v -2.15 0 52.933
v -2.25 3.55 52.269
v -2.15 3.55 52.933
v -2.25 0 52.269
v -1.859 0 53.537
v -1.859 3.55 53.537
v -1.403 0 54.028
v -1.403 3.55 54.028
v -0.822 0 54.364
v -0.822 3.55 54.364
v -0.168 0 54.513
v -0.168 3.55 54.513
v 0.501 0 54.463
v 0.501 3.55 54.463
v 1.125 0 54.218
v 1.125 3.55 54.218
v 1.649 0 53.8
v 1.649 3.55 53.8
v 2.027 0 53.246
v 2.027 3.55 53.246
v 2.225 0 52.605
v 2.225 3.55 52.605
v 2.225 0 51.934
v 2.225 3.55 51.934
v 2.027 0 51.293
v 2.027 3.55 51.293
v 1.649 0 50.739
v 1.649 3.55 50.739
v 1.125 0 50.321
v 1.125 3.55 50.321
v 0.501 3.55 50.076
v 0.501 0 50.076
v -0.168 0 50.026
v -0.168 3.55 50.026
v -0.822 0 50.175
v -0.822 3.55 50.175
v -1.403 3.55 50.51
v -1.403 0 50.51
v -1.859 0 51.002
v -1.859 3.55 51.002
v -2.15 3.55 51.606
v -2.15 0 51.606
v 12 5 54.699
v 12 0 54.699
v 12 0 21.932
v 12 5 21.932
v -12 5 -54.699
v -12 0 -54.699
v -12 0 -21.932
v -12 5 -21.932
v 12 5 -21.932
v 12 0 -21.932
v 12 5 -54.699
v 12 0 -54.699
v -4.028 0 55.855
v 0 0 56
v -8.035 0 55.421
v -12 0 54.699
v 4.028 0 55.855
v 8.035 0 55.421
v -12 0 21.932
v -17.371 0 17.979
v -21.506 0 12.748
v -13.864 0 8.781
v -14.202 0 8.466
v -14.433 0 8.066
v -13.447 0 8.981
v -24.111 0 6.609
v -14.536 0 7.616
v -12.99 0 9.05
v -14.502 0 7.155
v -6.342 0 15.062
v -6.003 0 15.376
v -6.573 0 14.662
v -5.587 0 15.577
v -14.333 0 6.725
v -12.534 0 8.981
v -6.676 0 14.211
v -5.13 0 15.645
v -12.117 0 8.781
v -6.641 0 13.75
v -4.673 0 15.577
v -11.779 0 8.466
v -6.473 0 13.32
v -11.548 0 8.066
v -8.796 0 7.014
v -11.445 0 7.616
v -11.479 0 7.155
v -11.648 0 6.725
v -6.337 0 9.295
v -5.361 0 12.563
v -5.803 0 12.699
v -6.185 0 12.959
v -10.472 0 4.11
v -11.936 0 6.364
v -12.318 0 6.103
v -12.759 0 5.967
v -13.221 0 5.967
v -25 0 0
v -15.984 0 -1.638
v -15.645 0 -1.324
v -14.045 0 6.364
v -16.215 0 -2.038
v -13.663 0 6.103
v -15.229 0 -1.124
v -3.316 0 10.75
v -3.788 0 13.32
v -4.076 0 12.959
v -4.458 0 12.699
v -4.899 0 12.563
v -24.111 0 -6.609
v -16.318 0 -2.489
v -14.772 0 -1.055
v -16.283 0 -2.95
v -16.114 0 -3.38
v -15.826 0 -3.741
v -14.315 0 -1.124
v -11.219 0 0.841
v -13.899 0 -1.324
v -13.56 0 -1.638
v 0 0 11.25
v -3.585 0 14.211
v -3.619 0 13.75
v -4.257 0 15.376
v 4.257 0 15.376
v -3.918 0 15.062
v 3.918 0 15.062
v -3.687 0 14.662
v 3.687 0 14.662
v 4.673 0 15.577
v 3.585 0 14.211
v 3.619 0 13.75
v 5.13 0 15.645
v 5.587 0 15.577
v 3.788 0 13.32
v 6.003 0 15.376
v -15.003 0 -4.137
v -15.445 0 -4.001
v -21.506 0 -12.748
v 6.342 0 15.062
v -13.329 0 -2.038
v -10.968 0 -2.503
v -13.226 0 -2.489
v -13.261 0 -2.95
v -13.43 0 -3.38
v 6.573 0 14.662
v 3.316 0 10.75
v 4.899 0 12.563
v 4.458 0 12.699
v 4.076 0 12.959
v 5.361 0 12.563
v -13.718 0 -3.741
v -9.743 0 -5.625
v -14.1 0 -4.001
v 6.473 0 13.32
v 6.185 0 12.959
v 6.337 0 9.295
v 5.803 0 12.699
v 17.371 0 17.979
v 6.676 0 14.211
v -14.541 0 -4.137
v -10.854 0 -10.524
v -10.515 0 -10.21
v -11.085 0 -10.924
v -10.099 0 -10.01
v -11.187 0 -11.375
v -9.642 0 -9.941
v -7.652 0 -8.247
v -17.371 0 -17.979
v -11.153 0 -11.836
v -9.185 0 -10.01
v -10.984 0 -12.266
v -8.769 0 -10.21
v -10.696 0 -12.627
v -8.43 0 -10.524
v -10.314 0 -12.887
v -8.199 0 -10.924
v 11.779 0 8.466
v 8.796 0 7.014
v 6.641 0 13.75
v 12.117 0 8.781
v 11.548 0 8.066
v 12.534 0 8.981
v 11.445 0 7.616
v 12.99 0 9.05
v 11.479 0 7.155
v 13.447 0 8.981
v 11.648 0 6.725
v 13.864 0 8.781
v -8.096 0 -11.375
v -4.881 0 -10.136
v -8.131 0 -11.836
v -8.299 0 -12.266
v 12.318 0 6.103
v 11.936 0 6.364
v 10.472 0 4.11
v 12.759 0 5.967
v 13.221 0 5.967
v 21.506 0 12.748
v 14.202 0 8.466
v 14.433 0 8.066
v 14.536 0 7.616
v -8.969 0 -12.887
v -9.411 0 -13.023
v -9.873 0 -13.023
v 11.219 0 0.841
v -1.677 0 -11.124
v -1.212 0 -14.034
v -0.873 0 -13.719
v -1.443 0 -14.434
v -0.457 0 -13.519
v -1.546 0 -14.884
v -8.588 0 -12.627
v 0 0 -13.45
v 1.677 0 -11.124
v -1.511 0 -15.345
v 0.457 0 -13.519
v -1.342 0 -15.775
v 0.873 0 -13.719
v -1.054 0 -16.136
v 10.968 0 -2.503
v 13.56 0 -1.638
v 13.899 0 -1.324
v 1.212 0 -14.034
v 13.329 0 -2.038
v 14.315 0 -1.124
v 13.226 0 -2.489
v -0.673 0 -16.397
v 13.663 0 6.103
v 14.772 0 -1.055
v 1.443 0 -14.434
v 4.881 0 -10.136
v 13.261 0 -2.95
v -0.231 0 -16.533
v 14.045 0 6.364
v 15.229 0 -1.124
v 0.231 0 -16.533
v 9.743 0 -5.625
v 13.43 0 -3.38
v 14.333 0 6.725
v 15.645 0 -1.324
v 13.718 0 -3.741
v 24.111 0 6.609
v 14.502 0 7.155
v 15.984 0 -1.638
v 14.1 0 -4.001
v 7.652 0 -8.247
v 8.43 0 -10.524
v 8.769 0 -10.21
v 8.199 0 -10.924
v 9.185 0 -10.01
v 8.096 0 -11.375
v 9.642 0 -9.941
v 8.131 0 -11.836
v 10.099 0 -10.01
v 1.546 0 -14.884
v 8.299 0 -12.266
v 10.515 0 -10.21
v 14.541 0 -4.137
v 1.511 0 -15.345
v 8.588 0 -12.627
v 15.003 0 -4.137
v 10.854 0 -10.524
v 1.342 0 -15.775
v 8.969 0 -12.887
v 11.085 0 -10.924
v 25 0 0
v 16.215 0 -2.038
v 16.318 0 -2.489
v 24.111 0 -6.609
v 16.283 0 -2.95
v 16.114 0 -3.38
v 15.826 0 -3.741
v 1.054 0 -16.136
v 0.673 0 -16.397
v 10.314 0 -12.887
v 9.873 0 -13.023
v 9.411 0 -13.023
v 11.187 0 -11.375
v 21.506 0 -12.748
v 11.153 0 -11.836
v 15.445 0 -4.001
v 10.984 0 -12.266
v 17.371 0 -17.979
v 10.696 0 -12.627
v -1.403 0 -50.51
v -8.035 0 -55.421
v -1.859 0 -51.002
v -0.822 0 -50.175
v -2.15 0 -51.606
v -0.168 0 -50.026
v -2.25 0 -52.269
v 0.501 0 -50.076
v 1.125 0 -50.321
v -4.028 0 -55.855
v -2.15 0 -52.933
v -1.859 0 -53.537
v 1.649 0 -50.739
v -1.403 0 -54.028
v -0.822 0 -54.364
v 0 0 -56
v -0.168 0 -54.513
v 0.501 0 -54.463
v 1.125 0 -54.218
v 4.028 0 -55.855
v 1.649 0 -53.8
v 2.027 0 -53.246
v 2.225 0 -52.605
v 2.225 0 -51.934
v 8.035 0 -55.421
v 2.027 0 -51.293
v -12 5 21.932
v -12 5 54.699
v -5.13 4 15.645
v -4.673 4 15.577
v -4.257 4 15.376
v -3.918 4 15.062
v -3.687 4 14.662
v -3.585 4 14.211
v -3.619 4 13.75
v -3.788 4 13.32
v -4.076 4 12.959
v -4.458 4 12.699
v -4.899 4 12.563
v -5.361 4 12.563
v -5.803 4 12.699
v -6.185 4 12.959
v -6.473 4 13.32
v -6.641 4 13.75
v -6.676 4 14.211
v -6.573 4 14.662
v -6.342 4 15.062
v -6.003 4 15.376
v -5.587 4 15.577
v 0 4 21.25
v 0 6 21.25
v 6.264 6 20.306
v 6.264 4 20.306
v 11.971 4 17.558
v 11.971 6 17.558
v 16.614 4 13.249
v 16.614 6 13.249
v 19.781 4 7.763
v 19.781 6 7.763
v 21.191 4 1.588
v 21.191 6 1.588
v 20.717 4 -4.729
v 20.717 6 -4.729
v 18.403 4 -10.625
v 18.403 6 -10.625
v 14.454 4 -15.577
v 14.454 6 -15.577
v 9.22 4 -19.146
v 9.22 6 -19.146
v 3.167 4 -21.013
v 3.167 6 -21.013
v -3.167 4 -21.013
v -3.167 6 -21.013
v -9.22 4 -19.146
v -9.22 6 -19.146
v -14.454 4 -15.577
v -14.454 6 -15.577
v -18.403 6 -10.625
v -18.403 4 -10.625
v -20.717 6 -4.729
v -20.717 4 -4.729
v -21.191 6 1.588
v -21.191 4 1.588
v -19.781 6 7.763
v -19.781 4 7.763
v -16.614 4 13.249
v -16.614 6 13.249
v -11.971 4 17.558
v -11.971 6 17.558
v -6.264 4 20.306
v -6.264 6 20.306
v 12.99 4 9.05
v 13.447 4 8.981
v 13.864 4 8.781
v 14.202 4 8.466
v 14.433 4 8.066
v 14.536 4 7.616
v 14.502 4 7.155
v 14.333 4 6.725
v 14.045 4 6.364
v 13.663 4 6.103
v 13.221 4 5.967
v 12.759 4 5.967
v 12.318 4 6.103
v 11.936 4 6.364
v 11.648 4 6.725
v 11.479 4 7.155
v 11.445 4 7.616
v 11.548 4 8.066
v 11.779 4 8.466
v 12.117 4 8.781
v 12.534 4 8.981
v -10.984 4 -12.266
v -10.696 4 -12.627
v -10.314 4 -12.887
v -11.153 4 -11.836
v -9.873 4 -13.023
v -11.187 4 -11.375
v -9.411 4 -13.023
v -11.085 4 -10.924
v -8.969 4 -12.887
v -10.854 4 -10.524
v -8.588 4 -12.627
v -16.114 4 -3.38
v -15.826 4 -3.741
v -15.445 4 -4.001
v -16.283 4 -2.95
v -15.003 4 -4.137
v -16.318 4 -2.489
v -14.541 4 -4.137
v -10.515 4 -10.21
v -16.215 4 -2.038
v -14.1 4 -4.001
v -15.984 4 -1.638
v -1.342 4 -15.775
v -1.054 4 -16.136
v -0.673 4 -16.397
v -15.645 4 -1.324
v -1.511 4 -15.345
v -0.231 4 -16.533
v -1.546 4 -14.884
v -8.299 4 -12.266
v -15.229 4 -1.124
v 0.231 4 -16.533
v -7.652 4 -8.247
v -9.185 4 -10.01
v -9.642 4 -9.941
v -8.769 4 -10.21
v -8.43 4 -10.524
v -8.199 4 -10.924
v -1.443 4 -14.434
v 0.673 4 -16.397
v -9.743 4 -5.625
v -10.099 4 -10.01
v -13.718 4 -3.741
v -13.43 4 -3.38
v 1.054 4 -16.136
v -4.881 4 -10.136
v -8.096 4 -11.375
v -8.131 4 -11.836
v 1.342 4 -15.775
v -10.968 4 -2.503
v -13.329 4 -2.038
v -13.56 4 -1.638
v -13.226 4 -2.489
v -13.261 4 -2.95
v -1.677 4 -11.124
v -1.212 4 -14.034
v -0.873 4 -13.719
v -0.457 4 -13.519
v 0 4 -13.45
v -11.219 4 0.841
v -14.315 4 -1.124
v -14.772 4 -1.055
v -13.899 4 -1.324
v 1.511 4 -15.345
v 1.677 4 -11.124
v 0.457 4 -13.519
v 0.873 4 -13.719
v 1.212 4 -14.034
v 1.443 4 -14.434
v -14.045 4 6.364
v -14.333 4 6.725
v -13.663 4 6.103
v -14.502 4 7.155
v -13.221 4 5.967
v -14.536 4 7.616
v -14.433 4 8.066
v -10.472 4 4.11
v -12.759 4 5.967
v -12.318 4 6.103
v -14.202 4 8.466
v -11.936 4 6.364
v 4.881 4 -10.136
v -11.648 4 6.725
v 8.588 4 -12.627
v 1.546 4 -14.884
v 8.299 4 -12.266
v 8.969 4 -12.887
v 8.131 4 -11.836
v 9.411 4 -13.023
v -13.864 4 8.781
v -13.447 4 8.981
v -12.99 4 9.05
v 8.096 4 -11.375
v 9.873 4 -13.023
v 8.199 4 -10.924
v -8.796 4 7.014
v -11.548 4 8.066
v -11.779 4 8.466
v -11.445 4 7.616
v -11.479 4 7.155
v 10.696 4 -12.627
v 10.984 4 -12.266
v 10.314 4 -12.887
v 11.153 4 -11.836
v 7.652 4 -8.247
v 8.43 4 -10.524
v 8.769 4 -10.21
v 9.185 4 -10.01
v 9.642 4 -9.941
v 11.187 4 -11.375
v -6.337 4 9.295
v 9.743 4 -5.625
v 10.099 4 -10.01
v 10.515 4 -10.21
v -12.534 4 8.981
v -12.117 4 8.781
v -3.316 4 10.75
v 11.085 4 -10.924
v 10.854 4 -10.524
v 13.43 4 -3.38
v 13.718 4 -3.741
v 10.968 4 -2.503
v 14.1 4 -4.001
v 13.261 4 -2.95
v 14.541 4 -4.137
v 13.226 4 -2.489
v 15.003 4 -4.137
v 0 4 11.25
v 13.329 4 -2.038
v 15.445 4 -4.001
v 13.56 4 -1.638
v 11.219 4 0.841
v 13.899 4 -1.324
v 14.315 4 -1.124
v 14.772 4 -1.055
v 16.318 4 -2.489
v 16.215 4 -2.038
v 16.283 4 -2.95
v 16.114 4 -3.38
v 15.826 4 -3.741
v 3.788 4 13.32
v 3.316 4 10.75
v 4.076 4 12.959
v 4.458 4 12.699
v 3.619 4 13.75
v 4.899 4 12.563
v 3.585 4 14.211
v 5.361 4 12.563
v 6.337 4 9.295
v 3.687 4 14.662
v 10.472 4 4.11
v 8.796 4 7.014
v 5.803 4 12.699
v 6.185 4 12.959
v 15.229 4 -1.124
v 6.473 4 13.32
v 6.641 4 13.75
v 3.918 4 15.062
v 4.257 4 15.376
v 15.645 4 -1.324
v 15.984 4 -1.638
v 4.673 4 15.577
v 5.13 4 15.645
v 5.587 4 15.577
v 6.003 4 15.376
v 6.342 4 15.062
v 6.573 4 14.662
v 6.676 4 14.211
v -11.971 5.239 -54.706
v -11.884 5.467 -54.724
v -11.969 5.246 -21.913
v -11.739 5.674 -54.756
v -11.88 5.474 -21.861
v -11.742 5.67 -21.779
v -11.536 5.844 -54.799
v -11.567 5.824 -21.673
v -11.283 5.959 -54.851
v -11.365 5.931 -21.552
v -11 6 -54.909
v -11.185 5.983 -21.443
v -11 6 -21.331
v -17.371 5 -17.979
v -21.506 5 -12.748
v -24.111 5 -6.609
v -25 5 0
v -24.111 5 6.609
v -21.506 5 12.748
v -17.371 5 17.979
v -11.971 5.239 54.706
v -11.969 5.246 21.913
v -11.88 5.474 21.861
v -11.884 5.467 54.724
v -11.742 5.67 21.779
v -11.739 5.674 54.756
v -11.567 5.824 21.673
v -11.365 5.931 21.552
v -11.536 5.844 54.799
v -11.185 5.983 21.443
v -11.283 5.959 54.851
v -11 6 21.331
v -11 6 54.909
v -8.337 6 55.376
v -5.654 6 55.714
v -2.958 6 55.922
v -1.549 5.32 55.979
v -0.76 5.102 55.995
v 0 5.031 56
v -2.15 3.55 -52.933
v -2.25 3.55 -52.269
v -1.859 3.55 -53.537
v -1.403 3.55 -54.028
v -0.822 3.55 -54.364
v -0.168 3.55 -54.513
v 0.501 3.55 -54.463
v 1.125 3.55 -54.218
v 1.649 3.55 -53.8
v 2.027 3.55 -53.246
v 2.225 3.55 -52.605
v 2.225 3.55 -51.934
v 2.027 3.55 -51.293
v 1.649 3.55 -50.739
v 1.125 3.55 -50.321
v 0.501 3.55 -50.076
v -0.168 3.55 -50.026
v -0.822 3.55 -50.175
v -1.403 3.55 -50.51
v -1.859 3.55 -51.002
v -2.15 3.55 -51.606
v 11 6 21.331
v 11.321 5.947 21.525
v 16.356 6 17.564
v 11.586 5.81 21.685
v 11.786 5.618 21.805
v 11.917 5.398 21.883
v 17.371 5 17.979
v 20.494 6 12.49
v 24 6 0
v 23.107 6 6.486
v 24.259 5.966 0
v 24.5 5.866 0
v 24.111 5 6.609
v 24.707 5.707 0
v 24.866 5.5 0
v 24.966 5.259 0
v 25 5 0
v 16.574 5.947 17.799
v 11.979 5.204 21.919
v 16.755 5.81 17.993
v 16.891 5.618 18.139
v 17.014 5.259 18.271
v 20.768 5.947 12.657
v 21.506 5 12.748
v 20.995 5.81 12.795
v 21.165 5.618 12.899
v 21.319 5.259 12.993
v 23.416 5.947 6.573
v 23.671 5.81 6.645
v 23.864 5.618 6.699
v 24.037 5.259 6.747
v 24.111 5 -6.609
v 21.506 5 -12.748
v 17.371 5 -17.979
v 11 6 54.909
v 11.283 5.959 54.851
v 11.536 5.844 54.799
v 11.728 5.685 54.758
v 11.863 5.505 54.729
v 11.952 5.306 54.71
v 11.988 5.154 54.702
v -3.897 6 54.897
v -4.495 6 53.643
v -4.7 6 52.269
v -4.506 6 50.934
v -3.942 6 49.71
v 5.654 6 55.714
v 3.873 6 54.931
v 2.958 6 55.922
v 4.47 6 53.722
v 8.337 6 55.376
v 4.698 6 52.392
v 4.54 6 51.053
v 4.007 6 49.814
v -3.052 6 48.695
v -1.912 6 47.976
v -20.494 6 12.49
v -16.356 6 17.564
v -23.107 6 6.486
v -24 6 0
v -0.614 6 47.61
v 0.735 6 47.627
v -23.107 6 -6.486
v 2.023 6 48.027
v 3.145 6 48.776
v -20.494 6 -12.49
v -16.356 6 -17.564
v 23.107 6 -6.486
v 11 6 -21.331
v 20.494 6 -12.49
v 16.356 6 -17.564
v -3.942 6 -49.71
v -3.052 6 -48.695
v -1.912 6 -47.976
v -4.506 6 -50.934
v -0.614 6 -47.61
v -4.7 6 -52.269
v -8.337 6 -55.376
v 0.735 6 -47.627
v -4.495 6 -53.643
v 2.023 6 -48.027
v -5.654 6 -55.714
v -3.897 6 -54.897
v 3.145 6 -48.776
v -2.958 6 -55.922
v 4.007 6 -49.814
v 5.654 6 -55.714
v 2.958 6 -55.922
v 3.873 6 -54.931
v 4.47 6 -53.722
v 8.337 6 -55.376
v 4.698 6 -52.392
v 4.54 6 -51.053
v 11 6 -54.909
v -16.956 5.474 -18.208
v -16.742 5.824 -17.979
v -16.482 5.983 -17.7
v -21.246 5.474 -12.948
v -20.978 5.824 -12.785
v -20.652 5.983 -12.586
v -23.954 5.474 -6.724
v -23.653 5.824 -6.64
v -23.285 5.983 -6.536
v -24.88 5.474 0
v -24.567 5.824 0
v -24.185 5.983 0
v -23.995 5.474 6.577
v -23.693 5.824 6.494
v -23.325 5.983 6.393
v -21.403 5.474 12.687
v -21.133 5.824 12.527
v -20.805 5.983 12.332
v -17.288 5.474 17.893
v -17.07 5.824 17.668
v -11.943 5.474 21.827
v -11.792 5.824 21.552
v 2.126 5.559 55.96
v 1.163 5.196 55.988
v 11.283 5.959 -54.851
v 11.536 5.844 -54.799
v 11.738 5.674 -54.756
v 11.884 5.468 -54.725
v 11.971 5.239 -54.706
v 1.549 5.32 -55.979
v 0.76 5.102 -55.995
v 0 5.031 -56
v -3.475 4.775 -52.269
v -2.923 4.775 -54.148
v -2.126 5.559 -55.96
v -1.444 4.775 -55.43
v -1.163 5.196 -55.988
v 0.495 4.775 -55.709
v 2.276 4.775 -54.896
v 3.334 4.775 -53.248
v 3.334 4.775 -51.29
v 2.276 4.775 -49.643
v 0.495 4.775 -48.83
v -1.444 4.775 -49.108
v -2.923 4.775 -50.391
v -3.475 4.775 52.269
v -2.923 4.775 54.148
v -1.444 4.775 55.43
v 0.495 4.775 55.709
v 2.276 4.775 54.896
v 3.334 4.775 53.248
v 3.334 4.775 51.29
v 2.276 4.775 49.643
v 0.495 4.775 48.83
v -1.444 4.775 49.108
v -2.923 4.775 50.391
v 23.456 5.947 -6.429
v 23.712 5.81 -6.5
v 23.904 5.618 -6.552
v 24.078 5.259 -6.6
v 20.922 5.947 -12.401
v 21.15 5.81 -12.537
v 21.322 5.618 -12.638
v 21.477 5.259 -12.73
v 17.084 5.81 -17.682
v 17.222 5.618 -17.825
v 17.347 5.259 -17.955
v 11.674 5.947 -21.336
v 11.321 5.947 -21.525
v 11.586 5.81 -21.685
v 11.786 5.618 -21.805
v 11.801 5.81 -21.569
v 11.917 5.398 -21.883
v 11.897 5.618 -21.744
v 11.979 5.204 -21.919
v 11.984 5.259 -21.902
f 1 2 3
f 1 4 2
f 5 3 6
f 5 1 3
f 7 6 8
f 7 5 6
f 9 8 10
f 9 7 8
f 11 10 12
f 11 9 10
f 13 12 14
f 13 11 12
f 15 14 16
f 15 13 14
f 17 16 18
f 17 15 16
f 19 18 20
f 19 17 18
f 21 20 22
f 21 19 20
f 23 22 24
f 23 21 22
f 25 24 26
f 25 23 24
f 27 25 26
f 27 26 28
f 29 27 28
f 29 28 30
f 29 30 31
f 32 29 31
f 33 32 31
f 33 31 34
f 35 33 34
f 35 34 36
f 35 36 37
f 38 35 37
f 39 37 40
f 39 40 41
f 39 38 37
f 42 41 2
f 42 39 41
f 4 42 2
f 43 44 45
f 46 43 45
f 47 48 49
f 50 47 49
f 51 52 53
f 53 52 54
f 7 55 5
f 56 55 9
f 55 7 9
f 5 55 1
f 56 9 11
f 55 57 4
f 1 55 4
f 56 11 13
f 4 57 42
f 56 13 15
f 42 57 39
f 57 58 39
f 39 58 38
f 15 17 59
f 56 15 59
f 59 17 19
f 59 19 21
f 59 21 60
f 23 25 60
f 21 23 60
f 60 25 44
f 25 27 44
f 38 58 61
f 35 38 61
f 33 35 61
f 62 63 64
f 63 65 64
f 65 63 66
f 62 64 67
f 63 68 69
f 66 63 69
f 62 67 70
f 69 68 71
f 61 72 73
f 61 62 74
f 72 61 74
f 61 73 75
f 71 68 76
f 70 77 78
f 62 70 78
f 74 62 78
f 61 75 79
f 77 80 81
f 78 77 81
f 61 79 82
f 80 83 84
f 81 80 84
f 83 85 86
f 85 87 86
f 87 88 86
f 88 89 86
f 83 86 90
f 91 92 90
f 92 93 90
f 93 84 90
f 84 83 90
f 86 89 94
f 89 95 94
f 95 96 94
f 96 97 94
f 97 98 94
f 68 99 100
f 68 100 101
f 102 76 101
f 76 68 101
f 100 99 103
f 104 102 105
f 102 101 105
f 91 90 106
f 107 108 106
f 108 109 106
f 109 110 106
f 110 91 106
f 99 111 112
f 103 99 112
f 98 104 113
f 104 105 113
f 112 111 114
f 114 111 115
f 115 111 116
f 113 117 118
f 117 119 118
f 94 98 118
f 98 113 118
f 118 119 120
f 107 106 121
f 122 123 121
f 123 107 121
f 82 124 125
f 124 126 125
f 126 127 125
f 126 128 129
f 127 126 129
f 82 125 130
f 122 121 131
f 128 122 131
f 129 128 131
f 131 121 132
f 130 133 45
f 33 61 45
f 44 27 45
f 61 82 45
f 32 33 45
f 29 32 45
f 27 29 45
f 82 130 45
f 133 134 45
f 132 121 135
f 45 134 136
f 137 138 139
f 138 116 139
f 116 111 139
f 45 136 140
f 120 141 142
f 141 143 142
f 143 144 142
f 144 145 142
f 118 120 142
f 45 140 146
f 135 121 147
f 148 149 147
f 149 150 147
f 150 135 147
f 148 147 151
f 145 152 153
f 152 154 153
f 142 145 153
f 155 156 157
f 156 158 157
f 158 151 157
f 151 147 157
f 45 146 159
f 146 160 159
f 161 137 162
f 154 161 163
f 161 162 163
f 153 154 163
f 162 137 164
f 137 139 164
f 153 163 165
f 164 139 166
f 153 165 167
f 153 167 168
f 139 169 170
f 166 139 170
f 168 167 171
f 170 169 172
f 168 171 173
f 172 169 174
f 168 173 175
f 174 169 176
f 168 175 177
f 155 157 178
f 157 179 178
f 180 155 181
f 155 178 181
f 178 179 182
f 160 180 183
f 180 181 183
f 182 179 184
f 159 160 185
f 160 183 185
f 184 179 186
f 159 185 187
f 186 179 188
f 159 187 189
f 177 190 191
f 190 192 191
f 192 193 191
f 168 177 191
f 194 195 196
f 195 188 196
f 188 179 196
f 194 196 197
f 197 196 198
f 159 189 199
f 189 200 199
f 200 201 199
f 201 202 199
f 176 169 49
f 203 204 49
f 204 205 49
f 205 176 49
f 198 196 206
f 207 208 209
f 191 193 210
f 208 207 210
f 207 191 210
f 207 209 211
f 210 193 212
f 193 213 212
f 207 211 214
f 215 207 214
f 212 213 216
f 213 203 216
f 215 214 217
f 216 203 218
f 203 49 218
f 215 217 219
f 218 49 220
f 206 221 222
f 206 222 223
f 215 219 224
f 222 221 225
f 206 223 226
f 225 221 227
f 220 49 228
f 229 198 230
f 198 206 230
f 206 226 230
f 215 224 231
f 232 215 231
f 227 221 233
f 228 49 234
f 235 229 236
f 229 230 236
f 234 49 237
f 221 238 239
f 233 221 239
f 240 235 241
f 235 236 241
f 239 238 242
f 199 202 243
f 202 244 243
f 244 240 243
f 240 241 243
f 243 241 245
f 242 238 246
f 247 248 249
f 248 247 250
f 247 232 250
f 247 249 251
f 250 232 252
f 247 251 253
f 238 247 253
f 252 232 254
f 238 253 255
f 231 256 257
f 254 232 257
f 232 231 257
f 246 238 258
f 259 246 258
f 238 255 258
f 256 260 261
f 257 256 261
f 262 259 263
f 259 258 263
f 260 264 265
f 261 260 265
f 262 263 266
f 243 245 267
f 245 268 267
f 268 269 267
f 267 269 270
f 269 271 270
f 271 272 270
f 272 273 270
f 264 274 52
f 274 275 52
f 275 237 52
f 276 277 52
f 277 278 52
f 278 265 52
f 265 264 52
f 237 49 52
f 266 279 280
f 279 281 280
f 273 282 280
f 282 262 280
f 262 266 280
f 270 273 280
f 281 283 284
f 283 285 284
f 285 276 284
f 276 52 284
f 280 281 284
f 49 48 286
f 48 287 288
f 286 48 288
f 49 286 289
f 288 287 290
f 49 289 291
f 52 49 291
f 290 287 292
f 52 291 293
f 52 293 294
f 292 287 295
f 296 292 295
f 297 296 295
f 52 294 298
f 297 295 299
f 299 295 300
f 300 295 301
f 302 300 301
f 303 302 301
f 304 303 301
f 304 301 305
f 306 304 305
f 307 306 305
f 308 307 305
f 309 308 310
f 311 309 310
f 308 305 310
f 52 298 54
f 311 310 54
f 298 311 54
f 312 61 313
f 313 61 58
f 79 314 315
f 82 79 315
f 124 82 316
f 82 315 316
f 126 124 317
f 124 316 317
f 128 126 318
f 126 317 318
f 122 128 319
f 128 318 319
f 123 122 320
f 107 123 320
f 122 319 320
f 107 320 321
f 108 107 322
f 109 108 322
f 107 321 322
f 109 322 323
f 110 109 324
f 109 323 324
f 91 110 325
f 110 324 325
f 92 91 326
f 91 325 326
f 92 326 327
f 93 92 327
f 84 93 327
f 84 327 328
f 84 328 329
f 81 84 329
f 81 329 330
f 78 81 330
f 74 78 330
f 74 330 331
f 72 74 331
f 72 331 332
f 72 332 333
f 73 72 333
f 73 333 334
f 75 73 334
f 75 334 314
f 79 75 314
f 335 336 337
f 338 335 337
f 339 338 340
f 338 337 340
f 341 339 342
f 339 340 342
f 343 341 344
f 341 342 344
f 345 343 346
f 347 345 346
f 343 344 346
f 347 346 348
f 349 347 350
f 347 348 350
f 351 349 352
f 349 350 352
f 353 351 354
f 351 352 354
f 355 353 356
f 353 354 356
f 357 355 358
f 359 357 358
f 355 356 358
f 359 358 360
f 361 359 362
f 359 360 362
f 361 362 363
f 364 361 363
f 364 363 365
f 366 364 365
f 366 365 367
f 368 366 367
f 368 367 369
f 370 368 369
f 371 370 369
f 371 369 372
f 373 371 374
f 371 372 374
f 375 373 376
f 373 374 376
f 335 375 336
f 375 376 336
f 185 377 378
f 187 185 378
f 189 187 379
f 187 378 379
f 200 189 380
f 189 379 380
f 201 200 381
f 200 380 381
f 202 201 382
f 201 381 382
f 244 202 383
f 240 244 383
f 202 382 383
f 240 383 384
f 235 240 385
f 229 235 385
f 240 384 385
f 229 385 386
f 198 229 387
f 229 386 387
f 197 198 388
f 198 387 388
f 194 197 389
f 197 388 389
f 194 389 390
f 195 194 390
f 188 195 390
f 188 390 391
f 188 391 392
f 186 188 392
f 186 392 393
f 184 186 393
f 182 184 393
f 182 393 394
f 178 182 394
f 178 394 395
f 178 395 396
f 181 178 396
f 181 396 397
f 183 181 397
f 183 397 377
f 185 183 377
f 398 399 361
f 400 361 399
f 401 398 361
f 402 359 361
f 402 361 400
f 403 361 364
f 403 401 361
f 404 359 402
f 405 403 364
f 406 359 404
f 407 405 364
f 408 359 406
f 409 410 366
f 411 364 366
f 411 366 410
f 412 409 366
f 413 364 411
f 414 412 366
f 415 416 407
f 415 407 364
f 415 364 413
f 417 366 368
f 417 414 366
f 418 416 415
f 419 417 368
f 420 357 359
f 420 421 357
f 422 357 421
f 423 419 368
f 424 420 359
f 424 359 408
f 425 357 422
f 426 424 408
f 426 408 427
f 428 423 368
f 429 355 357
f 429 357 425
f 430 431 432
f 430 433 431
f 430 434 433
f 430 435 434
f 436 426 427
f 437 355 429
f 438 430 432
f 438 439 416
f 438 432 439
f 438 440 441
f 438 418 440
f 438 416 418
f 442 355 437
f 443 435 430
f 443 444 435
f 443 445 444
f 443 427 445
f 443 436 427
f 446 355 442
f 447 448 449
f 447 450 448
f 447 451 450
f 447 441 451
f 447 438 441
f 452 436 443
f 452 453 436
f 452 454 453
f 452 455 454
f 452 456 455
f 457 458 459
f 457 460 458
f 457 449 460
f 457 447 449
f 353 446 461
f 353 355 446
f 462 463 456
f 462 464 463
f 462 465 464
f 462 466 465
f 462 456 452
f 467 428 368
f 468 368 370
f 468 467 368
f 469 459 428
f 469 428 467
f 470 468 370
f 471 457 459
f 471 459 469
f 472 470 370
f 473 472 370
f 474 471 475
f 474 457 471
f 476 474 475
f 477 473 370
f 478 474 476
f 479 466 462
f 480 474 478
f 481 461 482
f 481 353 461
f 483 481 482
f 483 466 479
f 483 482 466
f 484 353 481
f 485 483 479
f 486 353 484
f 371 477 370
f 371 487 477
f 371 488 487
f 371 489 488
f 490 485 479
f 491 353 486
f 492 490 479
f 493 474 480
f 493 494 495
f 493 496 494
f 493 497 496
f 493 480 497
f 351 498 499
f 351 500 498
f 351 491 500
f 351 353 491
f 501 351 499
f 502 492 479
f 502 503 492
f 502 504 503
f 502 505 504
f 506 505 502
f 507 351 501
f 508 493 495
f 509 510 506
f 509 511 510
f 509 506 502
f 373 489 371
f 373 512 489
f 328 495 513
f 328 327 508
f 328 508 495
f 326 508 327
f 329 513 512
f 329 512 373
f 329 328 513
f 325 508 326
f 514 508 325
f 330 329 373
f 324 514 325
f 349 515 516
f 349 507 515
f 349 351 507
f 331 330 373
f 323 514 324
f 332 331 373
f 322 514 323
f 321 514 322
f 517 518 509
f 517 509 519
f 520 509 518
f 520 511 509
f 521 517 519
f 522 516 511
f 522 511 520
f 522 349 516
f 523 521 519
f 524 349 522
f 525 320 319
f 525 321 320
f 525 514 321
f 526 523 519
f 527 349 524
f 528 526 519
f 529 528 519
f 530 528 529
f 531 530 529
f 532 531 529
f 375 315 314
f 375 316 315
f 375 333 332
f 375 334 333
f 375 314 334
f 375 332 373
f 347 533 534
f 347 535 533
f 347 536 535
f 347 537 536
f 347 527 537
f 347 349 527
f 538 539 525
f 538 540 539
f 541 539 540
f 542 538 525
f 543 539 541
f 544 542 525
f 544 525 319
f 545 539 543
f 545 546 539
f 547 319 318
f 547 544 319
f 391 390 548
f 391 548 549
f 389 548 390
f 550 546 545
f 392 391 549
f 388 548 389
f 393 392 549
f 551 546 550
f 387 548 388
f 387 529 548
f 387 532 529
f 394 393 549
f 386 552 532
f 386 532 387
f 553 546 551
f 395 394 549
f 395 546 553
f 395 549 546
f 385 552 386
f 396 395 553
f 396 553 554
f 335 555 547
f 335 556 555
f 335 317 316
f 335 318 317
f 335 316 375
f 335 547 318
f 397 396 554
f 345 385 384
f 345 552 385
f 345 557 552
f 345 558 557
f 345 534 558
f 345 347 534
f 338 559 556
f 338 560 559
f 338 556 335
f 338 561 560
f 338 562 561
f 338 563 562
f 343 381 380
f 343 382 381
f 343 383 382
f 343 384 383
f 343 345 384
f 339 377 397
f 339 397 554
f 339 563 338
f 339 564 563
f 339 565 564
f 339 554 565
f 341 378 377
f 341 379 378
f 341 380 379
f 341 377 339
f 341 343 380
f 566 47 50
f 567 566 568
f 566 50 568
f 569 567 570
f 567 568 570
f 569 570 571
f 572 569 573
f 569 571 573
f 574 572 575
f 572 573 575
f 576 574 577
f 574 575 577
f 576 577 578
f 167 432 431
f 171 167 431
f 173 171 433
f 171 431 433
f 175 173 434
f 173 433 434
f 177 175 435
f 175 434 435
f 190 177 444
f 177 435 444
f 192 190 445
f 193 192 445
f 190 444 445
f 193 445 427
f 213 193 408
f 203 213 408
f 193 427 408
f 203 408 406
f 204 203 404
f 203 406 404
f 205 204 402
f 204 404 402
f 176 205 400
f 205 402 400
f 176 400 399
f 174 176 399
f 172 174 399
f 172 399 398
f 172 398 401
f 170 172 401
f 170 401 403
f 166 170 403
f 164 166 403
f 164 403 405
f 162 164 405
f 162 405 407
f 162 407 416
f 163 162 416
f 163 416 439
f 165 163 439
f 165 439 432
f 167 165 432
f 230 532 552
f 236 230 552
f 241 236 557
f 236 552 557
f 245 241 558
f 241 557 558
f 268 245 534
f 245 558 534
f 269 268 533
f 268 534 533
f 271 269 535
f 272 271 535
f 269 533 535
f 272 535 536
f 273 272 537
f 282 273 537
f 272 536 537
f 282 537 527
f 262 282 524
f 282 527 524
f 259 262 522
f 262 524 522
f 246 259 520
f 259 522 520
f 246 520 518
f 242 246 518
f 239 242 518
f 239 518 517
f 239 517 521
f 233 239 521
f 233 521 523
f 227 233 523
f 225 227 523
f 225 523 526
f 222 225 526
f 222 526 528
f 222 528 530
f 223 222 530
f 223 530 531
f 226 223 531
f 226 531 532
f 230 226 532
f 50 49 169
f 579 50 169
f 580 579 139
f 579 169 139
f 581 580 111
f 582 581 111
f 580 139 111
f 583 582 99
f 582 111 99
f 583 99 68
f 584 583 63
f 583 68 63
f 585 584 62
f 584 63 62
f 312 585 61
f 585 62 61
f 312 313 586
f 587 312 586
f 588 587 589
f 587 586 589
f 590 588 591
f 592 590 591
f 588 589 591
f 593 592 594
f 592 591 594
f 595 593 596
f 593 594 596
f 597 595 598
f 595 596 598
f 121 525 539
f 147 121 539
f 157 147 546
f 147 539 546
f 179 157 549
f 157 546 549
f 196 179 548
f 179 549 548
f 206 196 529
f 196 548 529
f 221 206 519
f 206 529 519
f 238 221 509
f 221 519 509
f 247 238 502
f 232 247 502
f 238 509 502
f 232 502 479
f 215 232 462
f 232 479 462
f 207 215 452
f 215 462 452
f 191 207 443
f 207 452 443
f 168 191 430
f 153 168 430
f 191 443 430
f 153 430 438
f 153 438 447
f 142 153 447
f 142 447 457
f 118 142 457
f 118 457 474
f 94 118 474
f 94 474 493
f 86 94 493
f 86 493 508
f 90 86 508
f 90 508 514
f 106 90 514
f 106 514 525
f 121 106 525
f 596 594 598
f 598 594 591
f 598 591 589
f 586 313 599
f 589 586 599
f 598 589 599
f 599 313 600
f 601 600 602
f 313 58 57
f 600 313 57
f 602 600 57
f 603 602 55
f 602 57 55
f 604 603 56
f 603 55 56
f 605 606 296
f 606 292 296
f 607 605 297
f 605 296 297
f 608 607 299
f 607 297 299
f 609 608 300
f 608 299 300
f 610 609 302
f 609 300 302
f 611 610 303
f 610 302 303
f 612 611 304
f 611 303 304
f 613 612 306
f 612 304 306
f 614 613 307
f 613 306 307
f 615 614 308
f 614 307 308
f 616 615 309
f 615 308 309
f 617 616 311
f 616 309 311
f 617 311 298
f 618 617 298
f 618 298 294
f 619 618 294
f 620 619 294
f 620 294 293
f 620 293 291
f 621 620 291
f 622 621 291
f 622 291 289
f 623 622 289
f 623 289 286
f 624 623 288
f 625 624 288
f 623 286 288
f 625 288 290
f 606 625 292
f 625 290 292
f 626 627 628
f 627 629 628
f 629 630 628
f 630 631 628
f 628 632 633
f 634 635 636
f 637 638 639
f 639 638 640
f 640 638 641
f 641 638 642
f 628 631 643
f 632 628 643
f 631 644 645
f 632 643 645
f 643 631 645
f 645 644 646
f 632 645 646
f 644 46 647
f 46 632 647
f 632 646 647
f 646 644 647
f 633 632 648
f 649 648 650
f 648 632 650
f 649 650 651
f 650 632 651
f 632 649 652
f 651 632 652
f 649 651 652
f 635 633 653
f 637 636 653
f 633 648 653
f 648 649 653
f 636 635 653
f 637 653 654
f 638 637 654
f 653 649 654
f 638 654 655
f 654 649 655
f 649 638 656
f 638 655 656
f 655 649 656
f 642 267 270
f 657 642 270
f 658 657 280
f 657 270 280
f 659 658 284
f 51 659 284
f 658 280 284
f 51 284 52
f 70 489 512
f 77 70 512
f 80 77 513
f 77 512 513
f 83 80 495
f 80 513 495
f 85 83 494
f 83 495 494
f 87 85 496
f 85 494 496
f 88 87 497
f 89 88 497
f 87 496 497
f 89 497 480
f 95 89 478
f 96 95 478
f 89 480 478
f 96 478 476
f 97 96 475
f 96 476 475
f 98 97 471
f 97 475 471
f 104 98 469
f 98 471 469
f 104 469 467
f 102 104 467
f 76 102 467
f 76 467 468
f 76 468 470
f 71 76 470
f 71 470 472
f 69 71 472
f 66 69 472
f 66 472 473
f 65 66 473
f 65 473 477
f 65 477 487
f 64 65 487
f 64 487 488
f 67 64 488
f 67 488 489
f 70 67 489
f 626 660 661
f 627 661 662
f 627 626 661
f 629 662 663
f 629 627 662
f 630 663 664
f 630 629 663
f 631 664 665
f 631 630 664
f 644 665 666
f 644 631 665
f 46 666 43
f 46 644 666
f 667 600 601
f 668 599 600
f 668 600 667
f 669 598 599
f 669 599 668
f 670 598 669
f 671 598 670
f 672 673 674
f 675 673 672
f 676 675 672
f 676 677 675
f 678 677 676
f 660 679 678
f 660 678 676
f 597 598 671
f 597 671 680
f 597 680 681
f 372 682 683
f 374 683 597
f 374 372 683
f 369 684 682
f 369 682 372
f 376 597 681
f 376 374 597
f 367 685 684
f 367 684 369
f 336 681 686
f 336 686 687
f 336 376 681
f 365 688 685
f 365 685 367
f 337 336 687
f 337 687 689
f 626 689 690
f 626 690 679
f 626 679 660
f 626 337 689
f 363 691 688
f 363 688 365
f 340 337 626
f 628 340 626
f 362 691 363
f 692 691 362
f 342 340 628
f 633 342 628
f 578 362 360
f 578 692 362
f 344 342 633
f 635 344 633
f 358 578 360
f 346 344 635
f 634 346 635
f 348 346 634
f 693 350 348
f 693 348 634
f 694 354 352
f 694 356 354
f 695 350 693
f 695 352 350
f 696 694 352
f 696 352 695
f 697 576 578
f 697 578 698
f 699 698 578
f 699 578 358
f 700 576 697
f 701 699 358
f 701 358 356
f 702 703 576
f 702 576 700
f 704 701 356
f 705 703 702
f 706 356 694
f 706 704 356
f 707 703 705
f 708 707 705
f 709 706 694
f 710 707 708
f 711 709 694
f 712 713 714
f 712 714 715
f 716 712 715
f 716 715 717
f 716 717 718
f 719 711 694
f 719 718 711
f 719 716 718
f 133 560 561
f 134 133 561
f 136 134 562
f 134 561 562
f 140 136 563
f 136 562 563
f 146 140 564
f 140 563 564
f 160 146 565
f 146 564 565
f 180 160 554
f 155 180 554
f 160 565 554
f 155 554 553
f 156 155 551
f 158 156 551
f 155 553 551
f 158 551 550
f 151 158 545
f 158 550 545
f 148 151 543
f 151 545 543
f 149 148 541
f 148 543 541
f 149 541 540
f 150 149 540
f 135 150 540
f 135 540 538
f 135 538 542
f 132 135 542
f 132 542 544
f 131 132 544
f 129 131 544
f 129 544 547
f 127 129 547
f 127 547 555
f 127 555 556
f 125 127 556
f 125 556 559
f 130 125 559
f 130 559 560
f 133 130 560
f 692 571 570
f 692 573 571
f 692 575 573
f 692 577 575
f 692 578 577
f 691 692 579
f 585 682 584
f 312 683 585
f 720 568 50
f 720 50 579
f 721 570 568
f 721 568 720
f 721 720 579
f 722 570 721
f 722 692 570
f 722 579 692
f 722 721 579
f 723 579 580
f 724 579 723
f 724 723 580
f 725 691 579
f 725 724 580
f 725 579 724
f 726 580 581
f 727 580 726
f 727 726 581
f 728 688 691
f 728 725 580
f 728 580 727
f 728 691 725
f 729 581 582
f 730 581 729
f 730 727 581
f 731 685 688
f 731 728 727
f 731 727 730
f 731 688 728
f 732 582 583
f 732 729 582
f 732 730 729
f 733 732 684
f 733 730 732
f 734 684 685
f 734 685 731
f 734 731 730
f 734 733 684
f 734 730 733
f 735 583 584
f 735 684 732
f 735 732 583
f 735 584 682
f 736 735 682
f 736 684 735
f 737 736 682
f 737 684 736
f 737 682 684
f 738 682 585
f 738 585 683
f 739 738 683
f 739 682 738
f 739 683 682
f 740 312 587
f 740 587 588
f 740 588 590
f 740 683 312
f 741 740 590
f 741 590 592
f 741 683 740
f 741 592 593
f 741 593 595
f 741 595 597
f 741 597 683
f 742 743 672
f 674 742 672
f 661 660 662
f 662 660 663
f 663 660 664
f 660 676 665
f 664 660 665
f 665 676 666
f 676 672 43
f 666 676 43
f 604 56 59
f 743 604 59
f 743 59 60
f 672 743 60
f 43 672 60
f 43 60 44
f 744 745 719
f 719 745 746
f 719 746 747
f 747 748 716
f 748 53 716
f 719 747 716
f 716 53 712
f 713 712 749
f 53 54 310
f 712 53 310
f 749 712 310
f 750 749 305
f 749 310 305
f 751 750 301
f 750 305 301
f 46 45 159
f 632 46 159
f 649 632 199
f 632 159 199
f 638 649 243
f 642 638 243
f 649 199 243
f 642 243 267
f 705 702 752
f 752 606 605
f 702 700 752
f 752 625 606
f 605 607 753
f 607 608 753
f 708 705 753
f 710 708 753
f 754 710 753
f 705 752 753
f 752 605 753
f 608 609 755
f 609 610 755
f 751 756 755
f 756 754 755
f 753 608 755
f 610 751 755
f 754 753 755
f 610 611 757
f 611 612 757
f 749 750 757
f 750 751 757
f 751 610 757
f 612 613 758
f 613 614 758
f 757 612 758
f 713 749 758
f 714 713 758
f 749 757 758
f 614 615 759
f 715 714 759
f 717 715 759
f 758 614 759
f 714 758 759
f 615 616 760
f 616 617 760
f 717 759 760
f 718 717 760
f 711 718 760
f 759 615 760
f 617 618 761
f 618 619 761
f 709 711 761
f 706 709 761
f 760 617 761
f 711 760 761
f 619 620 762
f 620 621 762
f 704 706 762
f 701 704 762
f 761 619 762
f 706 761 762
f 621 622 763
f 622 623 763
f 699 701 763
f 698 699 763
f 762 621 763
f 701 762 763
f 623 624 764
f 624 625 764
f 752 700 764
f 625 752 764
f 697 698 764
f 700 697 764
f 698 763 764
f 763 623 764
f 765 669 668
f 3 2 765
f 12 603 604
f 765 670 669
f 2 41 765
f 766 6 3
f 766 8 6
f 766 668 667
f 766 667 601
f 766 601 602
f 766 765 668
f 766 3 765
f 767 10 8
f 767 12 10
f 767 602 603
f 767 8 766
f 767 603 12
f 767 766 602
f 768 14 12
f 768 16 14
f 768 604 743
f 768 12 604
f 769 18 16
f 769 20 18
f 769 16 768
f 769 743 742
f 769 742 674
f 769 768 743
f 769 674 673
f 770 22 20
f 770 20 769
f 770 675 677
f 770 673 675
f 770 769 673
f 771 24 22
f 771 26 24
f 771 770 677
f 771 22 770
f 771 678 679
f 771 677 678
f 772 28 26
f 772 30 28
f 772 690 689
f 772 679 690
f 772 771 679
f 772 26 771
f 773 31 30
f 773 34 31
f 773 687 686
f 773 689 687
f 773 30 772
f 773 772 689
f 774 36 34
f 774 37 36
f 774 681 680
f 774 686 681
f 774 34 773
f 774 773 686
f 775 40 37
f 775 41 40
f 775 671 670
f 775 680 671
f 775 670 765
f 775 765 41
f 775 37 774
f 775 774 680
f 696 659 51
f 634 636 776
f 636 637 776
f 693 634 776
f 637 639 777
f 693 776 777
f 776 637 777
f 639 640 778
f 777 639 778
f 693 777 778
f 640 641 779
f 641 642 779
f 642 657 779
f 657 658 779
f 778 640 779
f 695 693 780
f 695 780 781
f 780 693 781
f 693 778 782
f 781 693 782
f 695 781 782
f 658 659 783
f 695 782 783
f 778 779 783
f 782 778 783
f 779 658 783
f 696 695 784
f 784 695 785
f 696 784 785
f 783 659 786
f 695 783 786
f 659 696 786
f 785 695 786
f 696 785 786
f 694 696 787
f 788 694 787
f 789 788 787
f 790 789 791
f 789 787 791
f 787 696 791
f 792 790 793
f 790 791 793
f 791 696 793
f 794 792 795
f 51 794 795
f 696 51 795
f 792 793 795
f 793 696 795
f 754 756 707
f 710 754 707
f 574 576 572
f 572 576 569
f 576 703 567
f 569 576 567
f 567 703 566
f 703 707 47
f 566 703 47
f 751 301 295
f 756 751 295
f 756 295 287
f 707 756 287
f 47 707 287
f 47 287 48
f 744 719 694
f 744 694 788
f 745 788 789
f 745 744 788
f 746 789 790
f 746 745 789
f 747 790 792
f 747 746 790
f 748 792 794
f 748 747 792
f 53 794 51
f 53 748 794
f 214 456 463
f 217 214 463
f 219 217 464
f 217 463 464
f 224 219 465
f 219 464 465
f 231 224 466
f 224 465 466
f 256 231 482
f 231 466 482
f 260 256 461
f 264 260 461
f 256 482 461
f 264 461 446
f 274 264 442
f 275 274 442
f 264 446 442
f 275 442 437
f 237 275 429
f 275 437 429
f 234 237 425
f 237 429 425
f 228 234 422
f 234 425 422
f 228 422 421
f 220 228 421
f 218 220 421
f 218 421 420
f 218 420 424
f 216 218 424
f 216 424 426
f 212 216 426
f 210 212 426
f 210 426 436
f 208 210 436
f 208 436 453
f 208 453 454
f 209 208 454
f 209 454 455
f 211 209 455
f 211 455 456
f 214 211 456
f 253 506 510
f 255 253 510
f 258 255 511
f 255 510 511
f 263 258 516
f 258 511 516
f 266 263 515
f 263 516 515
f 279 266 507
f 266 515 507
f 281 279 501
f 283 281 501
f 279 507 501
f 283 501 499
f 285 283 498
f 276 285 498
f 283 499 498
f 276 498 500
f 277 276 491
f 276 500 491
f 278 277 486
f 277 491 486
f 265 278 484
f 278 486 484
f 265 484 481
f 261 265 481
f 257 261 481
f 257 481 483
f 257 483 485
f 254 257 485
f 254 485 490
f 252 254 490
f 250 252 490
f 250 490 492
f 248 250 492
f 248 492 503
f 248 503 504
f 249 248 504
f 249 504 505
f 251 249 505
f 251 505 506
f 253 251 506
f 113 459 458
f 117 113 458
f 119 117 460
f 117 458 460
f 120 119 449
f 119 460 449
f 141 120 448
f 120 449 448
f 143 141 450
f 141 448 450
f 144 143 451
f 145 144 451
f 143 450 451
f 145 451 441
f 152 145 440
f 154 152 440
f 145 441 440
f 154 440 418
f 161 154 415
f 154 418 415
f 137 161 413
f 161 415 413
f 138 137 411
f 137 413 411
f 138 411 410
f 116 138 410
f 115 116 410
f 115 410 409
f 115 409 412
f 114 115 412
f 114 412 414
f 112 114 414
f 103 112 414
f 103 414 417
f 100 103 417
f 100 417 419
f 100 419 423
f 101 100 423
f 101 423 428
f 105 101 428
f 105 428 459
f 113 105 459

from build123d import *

# Parameters (mm, degrees)
BOSS_EXTRUDE2_DEPTH                             = 6
CSK_FOR_M4_FLAT_HEAD_MACHINE_SCREW1_D           = 4.5
CSK_FOR_M4_FLAT_HEAD_MACHINE_SCREW1_CSINK_D     = 9.4
CSK_FOR_M4_FLAT_HEAD_MACHINE_SCREW1_CSINK_ANGLE = 90
SKETCH7_R                                       = 21.25
CUT_EXTRUDE2_DEPTH                              = 2
SKETCH8_R                                       = 11.25
CUT_EXTRUDE3_DEPTH                              = 62.457302349
SKETCH9_R                                       = 1.55
CUT_EXTRUDE4_DEPTH                              = 62.457302349
FILLET1_R                                       = 1


with BuildPart() as part:
    # Sketch2 → Boss-Extrude2 (new body)
    with BuildSketch(Plane(origin=(0, 0, 0), x_dir=(1, 0, 0), z_dir=(0, 1, 0))):
        with BuildLine():
            ThreePointArc((0, -50), (-6.044327096, -49.633316532), (-12, -48.538644398))
            Line((-12, -48.538644398), (-12, -54.699177325))
            ThreePointArc((-12, -54.699177325), (-6.035149949, -55.673844533), (0, -56))
            Line((0, -56), (0, -54.269322199))
            ThreePointArc((0, -54.269322199), (-2, -52.269322199), (0, -50.269322199))
            Line((0, -50.269322199), (0, -50))
        make_face()
        with BuildLine():
            ThreePointArc((2, -52.269322199), (1.414213562, -50.855108637), (0, -50.269322199))
            Line((0, -50.269322199), (0, -54.269322199))
            ThreePointArc((0, -54.269322199), (1.414213562, -53.683535761), (2, -52.269322199))
        make_face()
        with BuildLine():
            Line((0, -54.269322199), (0, -50.269322199))
            ThreePointArc((0, -50.269322199), (-2, -52.269322199), (0, -54.269322199))
        make_face()
        with BuildLine():
            ThreePointArc((2, -52.269322199), (1.414213562, -50.855108637), (0, -50.269322199))
            Line((0, -50.269322199), (0, -54.269322199))
            ThreePointArc((0, -54.269322199), (1.414213562, -53.683535761), (2, -52.269322199))
        make_face()
        with BuildLine():
            Line((0, -54.269322199), (0, -50.269322199))
            ThreePointArc((0, -50.269322199), (-2, -52.269322199), (0, -54.269322199))
        make_face()
        with BuildLine():
            Line((12, -54.699177325), (12, -48.538644398))
            ThreePointArc((12, -48.538644398), (6.044327096, -49.633316532), (0, -50))
            Line((0, -50), (0, -50.269322199))
            ThreePointArc((0, -50.269322199), (1.414213562, -50.855108637), (2, -52.269322199))
            ThreePointArc((2, -52.269322199), (1.414213562, -53.683535761), (0, -54.269322199))
            Line((0, -54.269322199), (0, -56))
            ThreePointArc((0, -56), (6.035149949, -55.673844533), (12, -54.699177325))
        make_face()
        with BuildLine():
            Line((0, -48.538644398), (-12, -48.538644398))
            ThreePointArc((-12, -48.538644398), (-6.044327096, -49.633316532), (0, -50))
            Line((0, -50), (0, -48.538644398))
        make_face()
        with BuildLine():
            Line((12, -48.538644398), (0, -48.538644398))
            Line((0, -48.538644398), (0, -50))
            ThreePointArc((0, -50), (6.044327096, -49.633316532), (12, -48.538644398))
        make_face()
        with BuildLine():
            ThreePointArc((0, -25), (-6.193028137, -24.220784514), (-12, -21.931712199))
            Line((-12, -21.931712199), (-12, -48.538644398))
            Line((-12, -48.538644398), (0, -48.538644398))
            Line((0, -48.538644398), (0, -25))
        make_face()
        with BuildLine():
            ThreePointArc((12, -21.931712199), (6.193028137, -24.220784514), (0, -25))
            Line((0, -25), (0, -48.538644398))
            Line((0, -48.538644398), (12, -48.538644398))
            Line((12, -48.538644398), (12, -21.931712199))
        make_face()
        with BuildLine():
            Line((0, -48.538644398), (-12, -48.538644398))
            ThreePointArc((-12, -48.538644398), (-6.044327096, -49.633316532), (0, -50))
            Line((0, -50), (0, -48.538644398))
        make_face()
        with BuildLine():
            Line((12, -48.538644398), (0, -48.538644398))
            Line((0, -48.538644398), (0, -50))
            ThreePointArc((0, -50), (6.044327096, -49.633316532), (12, -48.538644398))
        make_face()
        with BuildLine():
            ThreePointArc((-12, 48.538644398), (-6.044327096, 49.633316532), (0, 50))
            Line((0, 50), (0, 50.269322199))
            ThreePointArc((0, 50.269322199), (-2, 52.269322199), (0, 54.269322199))
            Line((0, 54.269322199), (0, 56))
            ThreePointArc((0, 56), (-6.035149949, 55.673844533), (-12, 54.699177325))
            Line((-12, 54.699177325), (-12, 48.538644398))
        make_face()
        with BuildLine():
            ThreePointArc((0, 54.269322199), (-2, 52.269322199), (0, 50.269322199))
            Line((0, 50.269322199), (0, 54.269322199))
        make_face()
        with BuildLine():
            Line((0, 54.269322199), (0, 50.269322199))
            ThreePointArc((0, 50.269322199), (1.414213562, 50.855108637), (2, 52.269322199))
            ThreePointArc((2, 52.269322199), (1.414213562, 53.683535761), (0, 54.269322199))
        make_face()
        with BuildLine():
            ThreePointArc((0, 54.269322199), (-2, 52.269322199), (0, 50.269322199))
            Line((0, 50.269322199), (0, 54.269322199))
        make_face()
        with BuildLine():
            Line((0, 54.269322199), (0, 50.269322199))
            ThreePointArc((0, 50.269322199), (1.414213562, 50.855108637), (2, 52.269322199))
            ThreePointArc((2, 52.269322199), (1.414213562, 53.683535761), (0, 54.269322199))
        make_face()
        with BuildLine():
            Line((0, 50.269322199), (0, 50))
            ThreePointArc((0, 50), (6.044327096, 49.633316532), (12, 48.538644398))
            Line((12, 48.538644398), (12, 54.699177325))
            ThreePointArc((12, 54.699177325), (6.035149949, 55.673844533), (0, 56))
            Line((0, 56), (0, 54.269322199))
            ThreePointArc((0, 54.269322199), (1.414213562, 53.683535761), (2, 52.269322199))
            ThreePointArc((2, 52.269322199), (1.414213562, 50.855108637), (0, 50.269322199))
        make_face()
        with BuildLine():
            Line((-12, 48.538644398), (0, 48.538644398))
            Line((0, 48.538644398), (0, 50))
            ThreePointArc((0, 50), (-6.044327096, 49.633316532), (-12, 48.538644398))
        make_face()
        with BuildLine():
            Line((0, 50), (0, 48.538644398))
            Line((0, 48.538644398), (12, 48.538644398))
            ThreePointArc((12, 48.538644398), (6.044327096, 49.633316532), (0, 50))
        make_face()
        with BuildLine():
            Line((-12, 48.538644398), (0, 48.538644398))
            Line((0, 48.538644398), (0, 50))
            ThreePointArc((0, 50), (-6.044327096, 49.633316532), (-12, 48.538644398))
        make_face()
        with BuildLine():
            Line((0, 50), (0, 48.538644398))
            Line((0, 48.538644398), (12, 48.538644398))
            ThreePointArc((12, 48.538644398), (6.044327096, 49.633316532), (0, 50))
        make_face()
        with BuildLine():
            Line((0, 25), (0, 48.538644398))
            Line((0, 48.538644398), (-12, 48.538644398))
            Line((-12, 48.538644398), (-12, 21.931712199))
            ThreePointArc((-12, 21.931712199), (-6.193028137, 24.220784514), (0, 25))
        make_face()
        with BuildLine():
            Line((12, 48.538644398), (0, 48.538644398))
            Line((0, 48.538644398), (0, 25))
            ThreePointArc((0, 25), (6.193028137, 24.220784514), (12, 21.931712199))
            Line((12, 21.931712199), (12, 48.538644398))
        make_face()
        with BuildLine():
            ThreePointArc((12, 21.931712199), (6.193028137, 24.220784514), (0, 25))
            Line((0, 25), (0, 21.25))
            ThreePointArc((0, 21.25), (15.0260191, 15.0260191), (21.25, 0))
            ThreePointArc((21.25, 0), (15.0260191, -15.0260191), (0, -21.25))
            Line((0, -21.25), (0, -25))
            ThreePointArc((0, -25), (6.193028137, -24.220784514), (12, -21.931712199))
            ThreePointArc((12, -21.931712199), (21.505813168, -12.747548784), (25, 0))
            ThreePointArc((25, 0), (21.505813168, 12.747548784), (12, 21.931712199))
        make_face()
        with BuildLine():
            Line((0, 21.25), (0, 25))
            ThreePointArc((0, 25), (-6.193028137, 24.220784514), (-12, 21.931712199))
            ThreePointArc((-12, 21.931712199), (-25, 0), (-12, -21.931712199))
            ThreePointArc((-12, -21.931712199), (-6.193028137, -24.220784514), (0, -25))
            Line((0, -25), (0, -21.25))
            ThreePointArc((0, -21.25), (-21.25, 0), (0, 21.25))
        make_face()
        with BuildLine():
            ThreePointArc((21.25, 0), (15.0260191, 15.0260191), (0, 21.25))
            Line((0, 21.25), (0, 0))
            Line((0, 0), (0, -21.25))
            ThreePointArc((0, -21.25), (15.0260191, -15.0260191), (21.25, 0))
        make_face()
        with BuildLine():
            Line((0, 0), (0, 21.25))
            ThreePointArc((0, 21.25), (-21.25, 0), (0, -21.25))
            Line((0, -21.25), (0, 0))
        make_face()
        with BuildLine():
            ThreePointArc((21.25, 0), (15.0260191, 15.0260191), (0, 21.25))
            Line((0, 21.25), (0, 0))
            Line((0, 0), (0, -21.25))
            ThreePointArc((0, -21.25), (15.0260191, -15.0260191), (21.25, 0))
        make_face()
        with BuildLine():
            Line((0, 0), (0, 21.25))
            ThreePointArc((0, 21.25), (-21.25, 0), (0, -21.25))
            Line((0, -21.25), (0, 0))
        make_face()
        with BuildLine():
            ThreePointArc((12, 21.931712199), (6.193028137, 24.220784514), (0, 25))
            Line((0, 25), (0, 21.25))
            ThreePointArc((0, 21.25), (15.0260191, 15.0260191), (21.25, 0))
            ThreePointArc((21.25, 0), (15.0260191, -15.0260191), (0, -21.25))
            Line((0, -21.25), (0, -25))
            ThreePointArc((0, -25), (6.193028137, -24.220784514), (12, -21.931712199))
            ThreePointArc((12, -21.931712199), (21.505813168, -12.747548784), (25, 0))
            ThreePointArc((25, 0), (21.505813168, 12.747548784), (12, 21.931712199))
        make_face()
        with BuildLine():
            Line((0, 21.25), (0, 25))
            ThreePointArc((0, 25), (-6.193028137, 24.220784514), (-12, 21.931712199))
            ThreePointArc((-12, 21.931712199), (-25, 0), (-12, -21.931712199))
            ThreePointArc((-12, -21.931712199), (-6.193028137, -24.220784514), (0, -25))
            Line((0, -25), (0, -21.25))
            ThreePointArc((0, -21.25), (-21.25, 0), (0, 21.25))
        make_face()
    extrude(amount=BOSS_EXTRUDE2_DEPTH)

    # CSK for M4 Flat Head Machine Screw1 (through all)
    with Locations(Plane(origin=(0, 6, 0), x_dir=(1, 0, 0), z_dir=(0, 1, 0))):
        with Locations((0, 52.269322197)):
            csk_for_m4_flat_head_machine_screw1 = CounterSinkHole(CSK_FOR_M4_FLAT_HEAD_MACHINE_SCREW1_D / 2, CSK_FOR_M4_FLAT_HEAD_MACHINE_SCREW1_CSINK_D / 2, counter_sink_angle=CSK_FOR_M4_FLAT_HEAD_MACHINE_SCREW1_CSINK_ANGLE)

    # Mirror1: CSK for M4 Flat Head Machine Screw1 across plane
    add(csk_for_m4_flat_head_machine_screw1.mirror(Plane.XY), mode=Mode.SUBTRACT)

    # Sketch7 → Cut-Extrude2 (cut)
    with BuildSketch(Plane(origin=(0, 6, 0), x_dir=(1, 0, 0), z_dir=(0, 1, 0))):
        with Locations(Location((0, 0, 0), (0, 0, 270))):
            Circle(SKETCH7_R)
    extrude(amount=-CUT_EXTRUDE2_DEPTH, mode=Mode.SUBTRACT)

    # Sketch8 → Cut-Extrude3 (cut, through all)
    with BuildSketch(Plane(origin=(0, 4, 0), x_dir=(1, 0, 0), z_dir=(0, 1, 0))):
        with Locations(Location((0, 0, 0), (0, 0, 270))):
            Circle(SKETCH8_R)
    extrude(amount=-CUT_EXTRUDE3_DEPTH, mode=Mode.SUBTRACT)

    # Sketch9 → Cut-Extrude4 (cut, through all)
    with BuildSketch(Plane(origin=(0, 4, 0), x_dir=(1, 0, 0), z_dir=(0, 1, 0))):
        with Locations(Location((0, 15, 0), (0, 0, 270))):
            Circle(SKETCH9_R)
        with Locations(Location((9.641814145, 11.490666647, 0), (0, 0, 270))):
            Circle(SKETCH9_R)
        with Locations(Location((14.772116295, 2.604722665, 0), (0, 0, 270))):
            Circle(SKETCH9_R)
        with Locations(Location((12.990381057, -7.5, 0), (0, 0, 270))):
            Circle(SKETCH9_R)
        with Locations(Location((5.13030215, -14.095389312, 0), (0, 0, 270))):
            Circle(SKETCH9_R)
        with Locations(Location((-5.13030215, -14.095389312, 0), (0, 0, 270))):
            Circle(SKETCH9_R)
        with Locations(Location((-12.990381057, -7.5, 0), (0, 0, 270))):
            Circle(SKETCH9_R)
        with Locations(Location((-14.772116295, 2.604722665, 0), (0, 0, 270))):
            Circle(SKETCH9_R)
        with Locations(Location((-9.641814145, 11.490666647, 0), (0, 0, 270))):
            Circle(SKETCH9_R)
    extrude(amount=-CUT_EXTRUDE4_DEPTH, mode=Mode.SUBTRACT)

    # Fillet1
    fillet1_edges = [part.edges().sort_by_distance(p)[0] for p in [
        (-12, 6, -38.315444762),
        (-25, 6, 0),
        (-12, 6, 38.315444762),
        (12, 6, 38.315444762),
        (25, 6, 0),
        (12, 6, -38.315444762),
    ]]
    fillet(fillet1_edges, radius=FILLET1_R)


solid = part.part
